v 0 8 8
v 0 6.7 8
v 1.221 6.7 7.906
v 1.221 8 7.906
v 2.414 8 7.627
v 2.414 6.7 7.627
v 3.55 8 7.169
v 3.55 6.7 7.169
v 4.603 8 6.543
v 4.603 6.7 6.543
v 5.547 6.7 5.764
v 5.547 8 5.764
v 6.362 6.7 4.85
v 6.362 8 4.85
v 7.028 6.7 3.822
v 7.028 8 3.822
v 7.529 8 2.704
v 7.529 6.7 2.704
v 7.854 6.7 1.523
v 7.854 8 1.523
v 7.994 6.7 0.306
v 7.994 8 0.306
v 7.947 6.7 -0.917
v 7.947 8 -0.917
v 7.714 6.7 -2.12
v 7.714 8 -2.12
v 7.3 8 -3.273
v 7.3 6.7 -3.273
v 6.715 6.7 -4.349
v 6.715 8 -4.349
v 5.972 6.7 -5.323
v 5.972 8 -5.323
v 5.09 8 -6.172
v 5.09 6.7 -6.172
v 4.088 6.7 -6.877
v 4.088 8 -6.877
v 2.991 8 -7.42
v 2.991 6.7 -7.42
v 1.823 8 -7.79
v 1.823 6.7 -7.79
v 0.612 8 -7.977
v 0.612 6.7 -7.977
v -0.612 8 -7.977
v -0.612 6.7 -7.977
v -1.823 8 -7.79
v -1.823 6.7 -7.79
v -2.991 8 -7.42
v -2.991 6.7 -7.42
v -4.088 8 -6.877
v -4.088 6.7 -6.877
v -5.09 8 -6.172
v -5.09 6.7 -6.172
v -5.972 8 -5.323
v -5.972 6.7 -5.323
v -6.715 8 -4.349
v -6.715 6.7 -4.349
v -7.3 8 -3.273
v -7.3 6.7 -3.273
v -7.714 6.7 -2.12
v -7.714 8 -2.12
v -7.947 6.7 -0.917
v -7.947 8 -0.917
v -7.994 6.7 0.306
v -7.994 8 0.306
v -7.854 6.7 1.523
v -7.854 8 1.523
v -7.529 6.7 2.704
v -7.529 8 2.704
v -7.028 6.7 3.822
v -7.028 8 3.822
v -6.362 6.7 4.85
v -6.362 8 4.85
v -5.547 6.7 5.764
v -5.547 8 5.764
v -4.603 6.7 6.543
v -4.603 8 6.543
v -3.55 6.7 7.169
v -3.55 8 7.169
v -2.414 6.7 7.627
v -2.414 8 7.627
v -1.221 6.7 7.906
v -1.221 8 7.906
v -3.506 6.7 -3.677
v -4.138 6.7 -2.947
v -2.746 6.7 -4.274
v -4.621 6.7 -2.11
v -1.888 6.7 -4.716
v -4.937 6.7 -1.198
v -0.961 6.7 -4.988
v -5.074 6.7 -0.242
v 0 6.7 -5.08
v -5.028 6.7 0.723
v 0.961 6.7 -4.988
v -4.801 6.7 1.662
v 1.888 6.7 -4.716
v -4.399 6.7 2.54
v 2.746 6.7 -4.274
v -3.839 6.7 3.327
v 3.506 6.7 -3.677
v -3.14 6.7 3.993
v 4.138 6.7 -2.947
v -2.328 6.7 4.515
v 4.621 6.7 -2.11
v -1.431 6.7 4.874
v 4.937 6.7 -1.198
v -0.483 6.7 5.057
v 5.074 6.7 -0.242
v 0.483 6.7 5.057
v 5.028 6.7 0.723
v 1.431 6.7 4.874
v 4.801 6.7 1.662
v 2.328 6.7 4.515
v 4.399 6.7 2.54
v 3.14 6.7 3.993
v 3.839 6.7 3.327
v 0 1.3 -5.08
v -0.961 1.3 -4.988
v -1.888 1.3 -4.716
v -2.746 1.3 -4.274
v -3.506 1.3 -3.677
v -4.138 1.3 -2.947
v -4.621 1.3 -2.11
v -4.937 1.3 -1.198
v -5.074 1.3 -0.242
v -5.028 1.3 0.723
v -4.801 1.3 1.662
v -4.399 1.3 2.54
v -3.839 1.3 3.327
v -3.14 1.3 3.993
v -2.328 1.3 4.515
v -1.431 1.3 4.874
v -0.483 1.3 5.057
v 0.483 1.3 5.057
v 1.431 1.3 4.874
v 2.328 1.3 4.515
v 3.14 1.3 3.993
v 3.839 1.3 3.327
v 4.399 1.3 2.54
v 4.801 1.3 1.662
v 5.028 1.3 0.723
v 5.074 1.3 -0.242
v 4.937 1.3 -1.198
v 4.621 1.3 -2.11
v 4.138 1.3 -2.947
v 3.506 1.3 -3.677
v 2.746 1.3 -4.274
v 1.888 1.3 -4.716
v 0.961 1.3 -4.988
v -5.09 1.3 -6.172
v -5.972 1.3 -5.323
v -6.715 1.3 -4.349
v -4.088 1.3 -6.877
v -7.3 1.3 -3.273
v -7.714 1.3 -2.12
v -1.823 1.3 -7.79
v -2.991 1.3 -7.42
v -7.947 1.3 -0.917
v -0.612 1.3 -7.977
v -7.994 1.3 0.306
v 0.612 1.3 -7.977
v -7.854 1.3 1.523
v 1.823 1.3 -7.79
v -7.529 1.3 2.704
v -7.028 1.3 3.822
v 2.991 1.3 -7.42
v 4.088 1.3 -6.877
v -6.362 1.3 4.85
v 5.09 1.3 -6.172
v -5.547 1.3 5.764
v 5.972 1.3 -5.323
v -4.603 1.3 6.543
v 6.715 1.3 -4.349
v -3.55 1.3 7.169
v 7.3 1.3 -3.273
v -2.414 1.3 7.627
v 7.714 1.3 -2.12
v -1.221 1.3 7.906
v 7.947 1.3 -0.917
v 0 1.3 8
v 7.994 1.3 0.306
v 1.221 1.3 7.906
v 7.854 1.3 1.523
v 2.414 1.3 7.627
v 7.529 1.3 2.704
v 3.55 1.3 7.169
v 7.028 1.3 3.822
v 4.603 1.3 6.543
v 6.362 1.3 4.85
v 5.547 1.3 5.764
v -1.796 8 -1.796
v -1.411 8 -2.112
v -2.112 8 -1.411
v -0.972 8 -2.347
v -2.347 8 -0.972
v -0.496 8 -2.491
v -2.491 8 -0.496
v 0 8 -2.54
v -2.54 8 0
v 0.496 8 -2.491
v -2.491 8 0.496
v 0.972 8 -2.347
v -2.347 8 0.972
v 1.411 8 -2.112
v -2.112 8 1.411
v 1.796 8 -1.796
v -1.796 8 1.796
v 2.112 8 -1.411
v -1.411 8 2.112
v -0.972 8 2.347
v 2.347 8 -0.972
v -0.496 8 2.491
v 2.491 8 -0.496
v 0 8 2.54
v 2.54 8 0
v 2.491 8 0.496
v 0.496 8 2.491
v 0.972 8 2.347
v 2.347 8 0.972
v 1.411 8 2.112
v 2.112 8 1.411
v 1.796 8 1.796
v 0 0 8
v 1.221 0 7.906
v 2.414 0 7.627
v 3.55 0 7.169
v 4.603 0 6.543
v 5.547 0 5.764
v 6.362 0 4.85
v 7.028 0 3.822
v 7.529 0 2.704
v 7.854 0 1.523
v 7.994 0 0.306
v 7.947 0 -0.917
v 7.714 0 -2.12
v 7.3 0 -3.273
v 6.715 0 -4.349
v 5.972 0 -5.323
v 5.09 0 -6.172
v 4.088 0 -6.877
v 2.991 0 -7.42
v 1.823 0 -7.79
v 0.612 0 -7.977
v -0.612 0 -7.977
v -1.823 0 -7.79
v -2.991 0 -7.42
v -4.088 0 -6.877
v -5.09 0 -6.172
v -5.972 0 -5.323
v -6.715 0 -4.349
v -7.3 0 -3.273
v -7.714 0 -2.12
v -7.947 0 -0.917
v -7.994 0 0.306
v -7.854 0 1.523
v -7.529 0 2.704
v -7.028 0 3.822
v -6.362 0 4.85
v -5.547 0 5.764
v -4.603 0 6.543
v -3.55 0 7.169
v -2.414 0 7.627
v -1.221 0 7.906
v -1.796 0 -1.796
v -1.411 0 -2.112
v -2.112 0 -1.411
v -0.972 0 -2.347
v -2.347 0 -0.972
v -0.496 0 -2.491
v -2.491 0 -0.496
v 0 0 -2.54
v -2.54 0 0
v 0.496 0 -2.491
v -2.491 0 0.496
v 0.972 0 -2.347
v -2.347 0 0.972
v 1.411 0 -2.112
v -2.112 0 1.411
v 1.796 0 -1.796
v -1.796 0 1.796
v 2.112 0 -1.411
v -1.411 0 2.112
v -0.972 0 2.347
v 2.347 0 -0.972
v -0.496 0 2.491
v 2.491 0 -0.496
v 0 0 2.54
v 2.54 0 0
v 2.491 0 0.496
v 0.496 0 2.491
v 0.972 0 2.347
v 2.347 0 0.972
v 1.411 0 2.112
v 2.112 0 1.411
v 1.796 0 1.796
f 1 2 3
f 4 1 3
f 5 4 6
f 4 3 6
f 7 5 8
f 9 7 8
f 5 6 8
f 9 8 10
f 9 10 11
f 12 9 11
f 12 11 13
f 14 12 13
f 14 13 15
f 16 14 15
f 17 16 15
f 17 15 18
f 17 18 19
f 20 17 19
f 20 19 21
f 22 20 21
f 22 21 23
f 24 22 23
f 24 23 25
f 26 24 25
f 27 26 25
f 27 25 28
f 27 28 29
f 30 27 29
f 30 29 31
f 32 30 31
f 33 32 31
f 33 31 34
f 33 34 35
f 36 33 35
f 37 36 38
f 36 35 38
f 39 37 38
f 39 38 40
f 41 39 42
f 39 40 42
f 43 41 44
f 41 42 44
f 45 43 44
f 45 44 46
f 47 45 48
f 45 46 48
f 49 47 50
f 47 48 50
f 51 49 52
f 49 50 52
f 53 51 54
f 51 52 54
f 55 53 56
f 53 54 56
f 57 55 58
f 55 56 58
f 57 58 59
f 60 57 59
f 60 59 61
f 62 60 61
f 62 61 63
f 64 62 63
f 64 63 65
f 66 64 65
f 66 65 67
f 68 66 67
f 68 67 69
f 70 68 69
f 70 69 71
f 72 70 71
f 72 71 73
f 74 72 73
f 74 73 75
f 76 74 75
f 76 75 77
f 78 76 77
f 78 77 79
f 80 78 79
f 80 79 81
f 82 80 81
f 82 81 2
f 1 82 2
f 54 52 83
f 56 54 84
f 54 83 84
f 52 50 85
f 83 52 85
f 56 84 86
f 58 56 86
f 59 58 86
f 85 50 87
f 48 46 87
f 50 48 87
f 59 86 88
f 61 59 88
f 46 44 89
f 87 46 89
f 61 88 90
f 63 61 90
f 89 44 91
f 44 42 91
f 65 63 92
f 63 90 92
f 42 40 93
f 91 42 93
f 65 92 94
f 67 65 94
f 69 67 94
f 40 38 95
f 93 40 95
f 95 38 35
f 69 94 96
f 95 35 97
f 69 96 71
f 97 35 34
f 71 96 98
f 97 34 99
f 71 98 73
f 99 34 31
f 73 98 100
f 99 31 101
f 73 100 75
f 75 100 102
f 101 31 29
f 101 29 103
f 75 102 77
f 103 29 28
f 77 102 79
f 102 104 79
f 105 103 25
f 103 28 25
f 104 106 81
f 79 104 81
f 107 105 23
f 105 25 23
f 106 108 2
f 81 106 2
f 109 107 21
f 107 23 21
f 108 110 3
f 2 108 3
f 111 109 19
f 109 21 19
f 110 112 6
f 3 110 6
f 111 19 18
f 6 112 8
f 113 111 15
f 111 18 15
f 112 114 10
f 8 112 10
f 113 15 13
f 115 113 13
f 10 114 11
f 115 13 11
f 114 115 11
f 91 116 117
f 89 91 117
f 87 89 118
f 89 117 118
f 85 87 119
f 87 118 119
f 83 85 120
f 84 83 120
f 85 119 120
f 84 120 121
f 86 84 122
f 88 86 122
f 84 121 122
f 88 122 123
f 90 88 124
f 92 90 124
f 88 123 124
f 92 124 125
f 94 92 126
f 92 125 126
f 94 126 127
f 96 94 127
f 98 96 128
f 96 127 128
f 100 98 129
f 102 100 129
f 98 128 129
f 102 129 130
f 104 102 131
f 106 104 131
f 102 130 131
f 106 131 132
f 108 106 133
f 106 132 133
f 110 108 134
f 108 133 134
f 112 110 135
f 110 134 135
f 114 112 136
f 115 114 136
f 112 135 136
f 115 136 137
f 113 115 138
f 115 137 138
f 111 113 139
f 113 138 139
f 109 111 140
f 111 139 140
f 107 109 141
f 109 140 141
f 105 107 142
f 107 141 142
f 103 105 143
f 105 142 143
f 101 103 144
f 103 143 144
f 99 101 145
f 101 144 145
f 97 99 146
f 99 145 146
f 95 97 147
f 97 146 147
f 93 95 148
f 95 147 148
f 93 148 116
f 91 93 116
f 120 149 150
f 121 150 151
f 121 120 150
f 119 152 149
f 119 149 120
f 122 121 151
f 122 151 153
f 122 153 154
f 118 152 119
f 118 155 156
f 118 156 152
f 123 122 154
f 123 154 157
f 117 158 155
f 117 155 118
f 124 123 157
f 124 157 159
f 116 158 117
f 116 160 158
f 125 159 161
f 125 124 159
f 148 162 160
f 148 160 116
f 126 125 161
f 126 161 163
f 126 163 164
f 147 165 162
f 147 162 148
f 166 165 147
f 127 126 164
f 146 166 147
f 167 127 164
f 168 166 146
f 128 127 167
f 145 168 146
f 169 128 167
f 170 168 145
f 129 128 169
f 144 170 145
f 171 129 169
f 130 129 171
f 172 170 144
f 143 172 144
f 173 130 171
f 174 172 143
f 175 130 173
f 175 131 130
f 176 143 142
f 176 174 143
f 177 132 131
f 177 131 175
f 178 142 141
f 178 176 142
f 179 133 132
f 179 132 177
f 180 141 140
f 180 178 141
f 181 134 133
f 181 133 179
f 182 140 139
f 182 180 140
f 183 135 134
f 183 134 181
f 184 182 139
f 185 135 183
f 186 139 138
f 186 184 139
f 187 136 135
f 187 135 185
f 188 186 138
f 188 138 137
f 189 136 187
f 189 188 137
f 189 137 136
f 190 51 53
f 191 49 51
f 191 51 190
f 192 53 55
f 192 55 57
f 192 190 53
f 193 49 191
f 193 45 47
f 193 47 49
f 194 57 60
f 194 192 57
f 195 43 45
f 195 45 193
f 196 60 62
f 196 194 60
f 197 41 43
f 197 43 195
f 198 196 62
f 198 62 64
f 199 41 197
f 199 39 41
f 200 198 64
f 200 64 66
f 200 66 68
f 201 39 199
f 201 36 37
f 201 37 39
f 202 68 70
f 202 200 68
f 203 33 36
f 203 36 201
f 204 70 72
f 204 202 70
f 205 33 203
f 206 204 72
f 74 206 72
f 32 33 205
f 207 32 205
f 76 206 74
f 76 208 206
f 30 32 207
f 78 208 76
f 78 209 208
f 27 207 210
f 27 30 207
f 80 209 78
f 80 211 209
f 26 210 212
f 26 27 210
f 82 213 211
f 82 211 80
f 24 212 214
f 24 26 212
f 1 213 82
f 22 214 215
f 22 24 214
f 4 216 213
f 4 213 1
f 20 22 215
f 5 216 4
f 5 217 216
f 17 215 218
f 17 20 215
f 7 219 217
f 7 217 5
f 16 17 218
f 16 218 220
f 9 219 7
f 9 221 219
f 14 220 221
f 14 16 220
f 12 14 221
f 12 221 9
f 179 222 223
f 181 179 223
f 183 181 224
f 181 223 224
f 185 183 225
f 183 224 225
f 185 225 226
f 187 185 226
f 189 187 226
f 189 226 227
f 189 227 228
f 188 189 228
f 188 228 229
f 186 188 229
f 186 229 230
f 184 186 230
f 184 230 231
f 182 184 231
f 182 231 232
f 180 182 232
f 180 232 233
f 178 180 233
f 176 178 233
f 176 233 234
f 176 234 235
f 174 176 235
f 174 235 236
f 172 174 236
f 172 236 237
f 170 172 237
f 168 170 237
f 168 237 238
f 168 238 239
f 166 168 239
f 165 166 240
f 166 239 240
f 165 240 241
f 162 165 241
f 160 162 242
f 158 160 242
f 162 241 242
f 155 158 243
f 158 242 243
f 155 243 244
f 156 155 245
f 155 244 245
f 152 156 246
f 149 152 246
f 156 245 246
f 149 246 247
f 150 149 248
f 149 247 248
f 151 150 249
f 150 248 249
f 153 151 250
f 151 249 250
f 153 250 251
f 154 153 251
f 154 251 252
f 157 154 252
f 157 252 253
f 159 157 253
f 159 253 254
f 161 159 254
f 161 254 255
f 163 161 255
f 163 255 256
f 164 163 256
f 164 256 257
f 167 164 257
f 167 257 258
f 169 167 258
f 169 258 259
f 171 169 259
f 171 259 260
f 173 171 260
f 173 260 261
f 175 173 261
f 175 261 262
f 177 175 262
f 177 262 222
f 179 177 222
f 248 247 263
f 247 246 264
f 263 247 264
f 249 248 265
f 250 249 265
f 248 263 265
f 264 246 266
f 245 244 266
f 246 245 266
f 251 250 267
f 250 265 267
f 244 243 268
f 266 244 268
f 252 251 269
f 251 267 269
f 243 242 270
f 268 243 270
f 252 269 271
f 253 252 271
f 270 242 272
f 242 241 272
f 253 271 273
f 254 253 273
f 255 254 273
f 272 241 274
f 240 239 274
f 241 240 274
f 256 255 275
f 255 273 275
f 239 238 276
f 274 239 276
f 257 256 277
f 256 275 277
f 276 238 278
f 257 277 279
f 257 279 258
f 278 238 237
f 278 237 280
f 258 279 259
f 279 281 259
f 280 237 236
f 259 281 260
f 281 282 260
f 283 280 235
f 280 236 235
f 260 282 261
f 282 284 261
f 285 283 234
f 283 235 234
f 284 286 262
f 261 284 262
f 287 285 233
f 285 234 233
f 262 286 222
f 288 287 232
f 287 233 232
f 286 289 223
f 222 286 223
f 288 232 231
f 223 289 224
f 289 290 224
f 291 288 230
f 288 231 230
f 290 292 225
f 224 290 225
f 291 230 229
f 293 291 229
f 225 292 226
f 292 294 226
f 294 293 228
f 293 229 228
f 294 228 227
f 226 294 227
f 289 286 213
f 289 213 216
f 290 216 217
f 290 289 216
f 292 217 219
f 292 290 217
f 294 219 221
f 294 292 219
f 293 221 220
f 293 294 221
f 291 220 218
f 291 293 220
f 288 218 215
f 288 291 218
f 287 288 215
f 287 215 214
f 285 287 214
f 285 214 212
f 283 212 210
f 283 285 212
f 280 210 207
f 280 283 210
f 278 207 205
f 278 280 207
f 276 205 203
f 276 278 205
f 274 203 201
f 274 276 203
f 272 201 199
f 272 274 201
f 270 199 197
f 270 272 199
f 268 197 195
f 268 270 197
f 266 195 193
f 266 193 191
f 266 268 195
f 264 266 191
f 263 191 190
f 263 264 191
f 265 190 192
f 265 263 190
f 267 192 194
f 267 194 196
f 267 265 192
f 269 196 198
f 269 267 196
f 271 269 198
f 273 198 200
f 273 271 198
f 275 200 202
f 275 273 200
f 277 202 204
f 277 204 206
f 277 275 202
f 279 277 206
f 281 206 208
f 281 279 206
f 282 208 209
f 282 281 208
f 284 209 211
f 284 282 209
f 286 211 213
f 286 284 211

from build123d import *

# Parameters (mm, degrees)
SKETCH1_R           = 8
SKETCH1_R_2         = 2.54
BOSS_EXTRUDE1_DEPTH = 8
SKETCH2_R           = 8
SKETCH2_R_2         = 5.08
CUT_EXTRUDE1_DEPTH  = 5.4


with BuildPart() as part:
    # Sketch1 → Boss-Extrude1 (new body)
    with BuildSketch(Plane(origin=(0, 0, 0), x_dir=(1, 0, 0), z_dir=(0, 1, 0))):
        with Locations(Location((0, 0, 0), (0, 0, 270))):
            Circle(SKETCH1_R)
        with Locations(Location((0, 0, 0), (0, 0, 270))):
            Circle(SKETCH1_R_2, mode=Mode.SUBTRACT)
    extrude(amount=BOSS_EXTRUDE1_DEPTH)

    # Sketch2 → Cut-Extrude1 (cut)
    with BuildSketch(Plane(origin=(0, 1.3, 0), x_dir=(1, 0, 0), z_dir=(0, 1, 0))):
        with Locations(Location((0, 0, 0), (0, 0, 270))):
            Circle(SKETCH2_R)
        with Locations(Location((0, 0, 0), (0, 0, 90))):
            Circle(SKETCH2_R_2, mode=Mode.SUBTRACT)
    extrude(amount=CUT_EXTRUDE1_DEPTH, mode=Mode.SUBTRACT)


solid = part.part
